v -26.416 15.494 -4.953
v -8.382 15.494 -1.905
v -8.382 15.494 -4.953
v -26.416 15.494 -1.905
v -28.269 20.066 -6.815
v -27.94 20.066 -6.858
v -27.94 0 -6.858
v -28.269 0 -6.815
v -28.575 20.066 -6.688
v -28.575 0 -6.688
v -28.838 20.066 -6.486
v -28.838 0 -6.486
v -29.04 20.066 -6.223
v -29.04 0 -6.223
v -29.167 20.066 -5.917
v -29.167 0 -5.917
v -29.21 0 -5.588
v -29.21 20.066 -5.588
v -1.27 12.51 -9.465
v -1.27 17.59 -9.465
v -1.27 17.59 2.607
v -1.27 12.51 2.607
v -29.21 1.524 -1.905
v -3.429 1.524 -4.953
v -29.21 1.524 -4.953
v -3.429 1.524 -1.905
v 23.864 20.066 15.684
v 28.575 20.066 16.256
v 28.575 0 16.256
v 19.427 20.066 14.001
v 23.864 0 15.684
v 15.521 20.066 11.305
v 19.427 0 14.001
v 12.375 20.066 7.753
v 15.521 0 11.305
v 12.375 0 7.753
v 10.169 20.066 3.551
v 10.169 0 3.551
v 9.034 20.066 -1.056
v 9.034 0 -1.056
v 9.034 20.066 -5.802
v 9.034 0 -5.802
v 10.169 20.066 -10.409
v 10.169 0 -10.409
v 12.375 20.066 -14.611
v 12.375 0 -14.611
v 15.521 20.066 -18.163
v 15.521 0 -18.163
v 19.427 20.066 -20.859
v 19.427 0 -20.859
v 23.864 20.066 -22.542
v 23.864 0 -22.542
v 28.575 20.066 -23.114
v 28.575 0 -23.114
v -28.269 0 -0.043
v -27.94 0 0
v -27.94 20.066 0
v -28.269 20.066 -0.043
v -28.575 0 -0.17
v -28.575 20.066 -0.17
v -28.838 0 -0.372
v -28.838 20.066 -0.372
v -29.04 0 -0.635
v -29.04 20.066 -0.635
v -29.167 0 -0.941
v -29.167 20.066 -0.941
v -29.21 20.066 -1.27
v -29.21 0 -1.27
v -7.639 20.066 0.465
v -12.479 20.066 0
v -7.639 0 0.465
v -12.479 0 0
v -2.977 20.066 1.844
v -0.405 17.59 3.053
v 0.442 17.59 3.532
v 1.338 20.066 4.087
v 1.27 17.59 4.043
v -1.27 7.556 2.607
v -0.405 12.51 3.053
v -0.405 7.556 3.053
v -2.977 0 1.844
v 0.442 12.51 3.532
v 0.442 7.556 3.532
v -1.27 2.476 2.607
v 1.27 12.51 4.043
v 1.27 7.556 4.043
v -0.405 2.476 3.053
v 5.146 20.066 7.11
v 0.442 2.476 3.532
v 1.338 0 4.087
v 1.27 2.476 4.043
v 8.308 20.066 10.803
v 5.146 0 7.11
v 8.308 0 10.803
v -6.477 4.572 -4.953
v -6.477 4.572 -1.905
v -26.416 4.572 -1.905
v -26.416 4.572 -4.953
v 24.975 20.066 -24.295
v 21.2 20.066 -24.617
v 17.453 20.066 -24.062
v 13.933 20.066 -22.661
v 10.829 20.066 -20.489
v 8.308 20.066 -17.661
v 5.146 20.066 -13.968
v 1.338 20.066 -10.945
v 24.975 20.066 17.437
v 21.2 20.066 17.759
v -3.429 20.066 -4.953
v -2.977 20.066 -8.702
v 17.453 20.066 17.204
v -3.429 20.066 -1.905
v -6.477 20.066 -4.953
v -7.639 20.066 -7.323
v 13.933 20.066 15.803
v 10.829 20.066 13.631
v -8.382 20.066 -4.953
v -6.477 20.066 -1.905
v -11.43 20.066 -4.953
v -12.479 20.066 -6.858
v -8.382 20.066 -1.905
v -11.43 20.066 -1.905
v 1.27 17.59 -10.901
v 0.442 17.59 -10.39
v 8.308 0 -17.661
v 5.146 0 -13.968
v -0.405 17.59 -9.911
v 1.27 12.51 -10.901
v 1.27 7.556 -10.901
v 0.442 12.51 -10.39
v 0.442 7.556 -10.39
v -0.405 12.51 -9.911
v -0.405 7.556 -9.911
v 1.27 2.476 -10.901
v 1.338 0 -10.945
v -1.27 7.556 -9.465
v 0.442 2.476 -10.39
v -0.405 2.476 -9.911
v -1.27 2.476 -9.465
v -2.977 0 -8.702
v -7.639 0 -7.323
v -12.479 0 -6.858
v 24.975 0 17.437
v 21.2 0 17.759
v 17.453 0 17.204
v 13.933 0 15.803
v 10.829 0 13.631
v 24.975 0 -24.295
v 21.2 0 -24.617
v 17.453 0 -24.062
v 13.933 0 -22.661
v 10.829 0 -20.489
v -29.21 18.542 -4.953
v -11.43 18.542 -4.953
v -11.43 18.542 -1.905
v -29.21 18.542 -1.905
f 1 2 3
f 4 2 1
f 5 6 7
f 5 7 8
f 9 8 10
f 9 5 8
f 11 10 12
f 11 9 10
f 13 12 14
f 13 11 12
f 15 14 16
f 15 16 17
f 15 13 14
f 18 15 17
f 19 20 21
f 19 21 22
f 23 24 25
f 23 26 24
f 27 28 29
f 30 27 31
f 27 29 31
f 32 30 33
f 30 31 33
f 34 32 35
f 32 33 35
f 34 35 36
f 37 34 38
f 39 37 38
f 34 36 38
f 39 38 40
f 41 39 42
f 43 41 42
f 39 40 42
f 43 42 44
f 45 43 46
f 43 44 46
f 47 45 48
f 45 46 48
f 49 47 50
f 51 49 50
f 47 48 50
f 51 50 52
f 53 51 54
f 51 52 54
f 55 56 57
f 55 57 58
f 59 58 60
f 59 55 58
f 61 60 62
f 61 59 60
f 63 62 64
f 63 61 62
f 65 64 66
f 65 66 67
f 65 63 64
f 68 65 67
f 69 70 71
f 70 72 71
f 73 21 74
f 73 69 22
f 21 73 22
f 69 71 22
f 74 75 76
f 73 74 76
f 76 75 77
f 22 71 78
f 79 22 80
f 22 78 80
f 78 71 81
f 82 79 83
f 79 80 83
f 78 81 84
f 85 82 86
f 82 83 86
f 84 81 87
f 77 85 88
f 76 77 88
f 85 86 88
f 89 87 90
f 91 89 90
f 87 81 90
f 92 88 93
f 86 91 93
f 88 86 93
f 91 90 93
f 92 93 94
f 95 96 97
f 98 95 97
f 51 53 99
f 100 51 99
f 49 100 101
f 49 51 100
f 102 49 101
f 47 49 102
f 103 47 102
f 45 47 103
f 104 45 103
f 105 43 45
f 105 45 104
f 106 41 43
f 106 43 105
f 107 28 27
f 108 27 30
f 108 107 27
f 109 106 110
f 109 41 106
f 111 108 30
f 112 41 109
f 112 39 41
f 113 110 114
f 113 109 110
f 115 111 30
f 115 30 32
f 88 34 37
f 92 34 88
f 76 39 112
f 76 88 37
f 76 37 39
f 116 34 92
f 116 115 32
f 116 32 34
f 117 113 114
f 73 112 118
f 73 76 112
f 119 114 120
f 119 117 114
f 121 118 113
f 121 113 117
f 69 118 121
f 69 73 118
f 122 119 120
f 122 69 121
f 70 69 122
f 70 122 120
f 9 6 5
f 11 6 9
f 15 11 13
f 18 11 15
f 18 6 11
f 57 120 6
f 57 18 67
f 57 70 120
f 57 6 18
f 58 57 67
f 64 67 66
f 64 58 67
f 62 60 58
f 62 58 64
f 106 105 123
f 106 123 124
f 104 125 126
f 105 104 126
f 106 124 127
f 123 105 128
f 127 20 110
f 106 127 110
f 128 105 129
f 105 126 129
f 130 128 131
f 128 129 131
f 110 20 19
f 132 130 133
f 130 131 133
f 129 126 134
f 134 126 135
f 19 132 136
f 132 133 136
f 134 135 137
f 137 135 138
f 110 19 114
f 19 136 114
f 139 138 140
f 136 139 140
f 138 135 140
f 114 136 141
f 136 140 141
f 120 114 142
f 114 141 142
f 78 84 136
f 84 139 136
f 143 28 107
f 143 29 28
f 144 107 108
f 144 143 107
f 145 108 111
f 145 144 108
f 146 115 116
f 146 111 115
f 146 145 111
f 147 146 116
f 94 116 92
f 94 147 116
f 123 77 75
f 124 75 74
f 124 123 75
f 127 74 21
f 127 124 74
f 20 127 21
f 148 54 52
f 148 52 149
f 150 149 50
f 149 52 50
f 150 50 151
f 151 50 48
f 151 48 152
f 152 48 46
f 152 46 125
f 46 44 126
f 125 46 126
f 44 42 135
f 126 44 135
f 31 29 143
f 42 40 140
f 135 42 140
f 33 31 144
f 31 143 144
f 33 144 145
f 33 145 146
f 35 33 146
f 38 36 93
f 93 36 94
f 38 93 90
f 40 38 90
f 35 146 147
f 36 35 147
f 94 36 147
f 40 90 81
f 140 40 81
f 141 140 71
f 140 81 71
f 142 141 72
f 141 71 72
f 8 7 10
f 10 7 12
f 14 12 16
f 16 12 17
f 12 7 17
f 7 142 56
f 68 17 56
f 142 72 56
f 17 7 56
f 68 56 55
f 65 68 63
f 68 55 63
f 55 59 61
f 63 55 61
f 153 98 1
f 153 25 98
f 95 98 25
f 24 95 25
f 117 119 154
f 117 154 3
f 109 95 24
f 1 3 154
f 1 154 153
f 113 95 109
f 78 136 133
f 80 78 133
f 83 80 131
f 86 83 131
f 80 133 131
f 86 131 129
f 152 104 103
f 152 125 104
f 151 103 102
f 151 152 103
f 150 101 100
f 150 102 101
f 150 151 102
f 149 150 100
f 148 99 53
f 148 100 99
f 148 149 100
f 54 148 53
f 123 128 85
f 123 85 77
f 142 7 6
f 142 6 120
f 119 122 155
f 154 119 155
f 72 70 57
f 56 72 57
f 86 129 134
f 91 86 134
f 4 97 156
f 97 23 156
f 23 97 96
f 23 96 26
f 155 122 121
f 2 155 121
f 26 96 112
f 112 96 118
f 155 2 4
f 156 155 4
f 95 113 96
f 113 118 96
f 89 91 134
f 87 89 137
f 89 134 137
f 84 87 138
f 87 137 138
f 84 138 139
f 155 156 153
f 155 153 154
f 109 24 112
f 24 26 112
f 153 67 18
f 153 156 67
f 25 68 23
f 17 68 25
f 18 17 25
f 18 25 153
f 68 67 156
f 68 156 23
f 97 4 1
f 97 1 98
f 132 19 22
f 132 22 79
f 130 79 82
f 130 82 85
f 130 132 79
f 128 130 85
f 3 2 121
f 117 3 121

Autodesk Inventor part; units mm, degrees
ref_plane "YZ Plane" through (0, 0, 0) normal (1, 0, 0) x (0, 1, 0)
ref_plane "XZ Plane" through (0, 0, 0) normal (0, 1, 0) x (-1, 0, 0)
ref_plane "XY Plane" through (0, 0, 0) normal (0, 0, 1) x (1, 0, 0)
sketch "Sketch1" plane through (0, 0, 0) normal (0, 1, 0) x (-1, 0, 0)
  line L0 (0, 0) -> (29.21, 0)
  line L1 (29.21, 0) -> (29.21, -6.858)
  line L2 (29.21, -6.858) -> (0, -6.858)
  line L3 (0, -6.858) -> (0, 0)
  line L4 (0, 0) -> (-3.81, 0)
  line L5 (-3.81, 0) -> (-3.81, -6.858)
  line L6 (-3.81, -6.858) -> (0, -6.858)
  line L7 (0, -6.858) -> (0, 0)
  circle A0 centre (-28.575, -3.429) radius 19.685
  circle A1 centre (-28.575, -3.429) radius 24.765
  arc A2 (-8.3079, 10.803) -> (12.4788, 0) centre (12.4788, 25.4) ccw
  arc A3 (12.4788, -6.858) -> (-8.3079, -17.661) centre (12.4788, -32.258) ccw
  line L8 (-28.575, -3.429) -> (-28.575, 21.336)
  line L9 (-28.575, -3.429) -> (-3.81, -3.429) construction
  line L10 (-28.575, -3.429) -> (-28.575, -28.194)
  arc A4 (-8.3079, 10.803) -> (-28.575, 16.256) centre (-21.7065, 1.3942) ccw
  arc A5 (-28.575, -23.114) -> (-8.3079, -17.661) centre (-21.7065, -8.2522) ccw
  point P0 (0, -3.429)
  dimension "d0" = 29.21
  dimension "d1" = 6.858
  dimension "d4" = 3.81
  dimension "d5" = 39.37
  dimension "d6" = 6.858
  dimension "d7" = 5.08
  dimension "d8" = 25.4
  dimension "d9" = 25.4
  dimension "d10" = 180
  dimension "d11" = 90
  dimension "d12" = 90
extrude "Extrusion1" add sketch "Sketch1" along normal blind 20.066 contours L4 L5 A1 A2 L0 | L0 L1 L2 L3 | L3 L6 L5 L4 | L2 A3 A1 L5 L6 | A1 A5 A0 A4
sketch "Sketch3" plane through (-29.21, 0, 0) normal (0, 0, 1) x (1, 0, 0)
  line L0 (0, 0) -> (16.7312, 0) projected
  line L1 (16.7312, 0) -> (16.7312, 20.066) projected
  line L2 (0, 20.066) -> (16.7312, 20.066) projected
  line L3 (0, 0) -> (0, 20.066) projected
  line L4 (16.7312, 0) -> (37.5179, 0) projected
  line L5 (37.5179, 0) -> (37.5179, 20.066) projected
  line L6 (16.7312, 20.066) -> (37.5179, 20.066) projected
  line L7 (16.7312, 0) -> (16.7312, 20.066) projected
  line L8 (37.5179, 0) -> (57.785, 0) projected
  line L9 (57.785, 0) -> (57.785, 20.066) projected
  line L10 (37.5179, 20.066) -> (57.785, 20.066) projected
  line L11 (37.5179, 0) -> (37.5179, 20.066) projected
  line L12 (0, 0) -> (0, 20.066) projected
  line L13 (0, 10.033) -> (29.21, 10.033) construction
  line L14 (16.7312, 20.066) -> (37.5179, 20.066) projected
  line L15 (29.21, 20.066) -> (29.21, 0) construction
  line L16 (16.7312, 0) -> (37.5179, 0) projected
  line L17 (27.94, 12.5095) -> (30.48, 12.5095)
  line L18 (30.48, 12.5095) -> (30.48, 17.5895)
  line L19 (30.48, 17.5895) -> (27.94, 17.5895)
  line L20 (27.94, 17.5895) -> (27.94, 12.5095)
  line L21 (27.94, 7.5565) -> (30.48, 7.5565)
  line L22 (30.48, 7.5565) -> (30.48, 2.4765)
  line L23 (30.48, 2.4765) -> (27.94, 2.4765)
  line L24 (27.94, 2.4765) -> (27.94, 7.5565)
  point P0 (29.21, 0)
  point P1 (29.21, 12.5095)
  dimension "d13" = 29.21
  dimension "d14" = 2.54
  dimension "d15" = 5.08
  dimension "d16" = 2.4765
  dimension "d17" = 2.4765
extrude "Extrusion2" cut sketch "Sketch3" along normal through all both and the other way through all contours L20 L19 L18 L17 | L21 L22 L23 L24
sketch "Sketch4" plane through (-29.21, 0, 0) normal (0, 0, 1) x (1, 0, 0)
  line L0 (0, 20.066) -> (16.7312, 20.066) projected
  line L1 (0, 0) -> (16.7312, 0) projected
  line L2 (0, 0) -> (0, 20.066) projected
  line L3 (0, 18.542) -> (2.794, 18.542)
  line L4 (2.794, 18.542) -> (2.794, 1.524)
  line L5 (2.794, 1.524) -> (0, 1.524)
  line L6 (0, 1.524) -> (0, 18.542)
  line L7 (0, 10.033) -> (17.78, 10.033) construction
  line L8 (2.794, 18.542) -> (17.78, 18.542)
  line L9 (17.78, 18.542) -> (17.78, 15.494)
  line L10 (17.78, 15.494) -> (2.794, 15.494)
  line L11 (2.794, 15.494) -> (2.794, 18.542)
  line L12 (16.7312, 20.066) -> (37.5179, 20.066) projected
  line L13 (17.78, 15.494) -> (20.828, 15.494)
  line L14 (20.828, 15.494) -> (20.828, 20.066)
  line L15 (20.828, 20.066) -> (17.78, 20.066)
  line L16 (17.78, 20.066) -> (17.78, 15.494)
  line L17 (2.794, 1.524) -> (22.733, 1.524)
  line L18 (22.733, 1.524) -> (22.733, 4.572)
  line L19 (22.733, 4.572) -> (2.794, 4.572)
  line L20 (2.794, 4.572) -> (2.794, 1.524)
  line L21 (22.733, 1.524) -> (25.781, 1.524)
  line L22 (25.781, 1.524) -> (25.781, 20.066)
  line L23 (25.781, 20.066) -> (22.733, 20.066)
  line L24 (22.733, 20.066) -> (22.733, 1.524)
  point P0 (29.21, 0)
  point P1 (17.78, 17.018)
  point P2 (2.794, 4.572)
  point P3 (2.794, 15.494)
  point P4 (17.78, 18.542)
  dimension "d25" = 2.794
  dimension "d26" = 17.018
  dimension "d27" = 1.524
  dimension "d28" = 1.524
  dimension "d29" = 17.78
  dimension "d30" = 3.048
  dimension "d31" = 3.048
  dimension "d32" = 1.905
  dimension "d33" = 3.048
  dimension "d34" = 3.048
extrude "Extrusion3" cut sketch "Sketch4" against normal blind 4.953 contours L3 L4 L5 L2 | L12 L14 L13 L9 L16 | L8 L9 L10 L4 | L4 L19 L18 L17 | L12 L22 L21 L18 L24
sketch "Sketch5" plane through (-26.416, 4.572, 0) normal (0, 0, 1) x (1, 0, 0)
  line L0 (-2.794, 13.97) -> (13.9372, 13.97) projected
  line L1 (13.9372, 10.922) -> (0, 10.922) projected
  line L2 (13.9372, 10.922) -> (13.9372, 13.97) projected
  line L3 (-2.794, -3.048) -> (-2.794, 13.97) projected
  line L4 (0, 10.922) -> (0, 0) projected
  line L5 (13.9372, -3.048) -> (-2.794, -3.048) projected
  line L6 (0, 0) -> (13.9372, 0) projected
  line L7 (13.9372, -3.048) -> (13.9372, 0) projected
  line L8 (13.9372, 10.922) -> (13.9372, 13.97) projected
  line L9 (14.986, 13.97) -> (13.9372, 13.97) projected
  line L10 (14.986, 15.494) -> (14.986, 13.97) projected
  line L11 (18.034, 15.494) -> (14.986, 15.494) projected
  line L12 (18.034, 10.922) -> (18.034, 15.494) projected
  line L13 (13.9372, 10.922) -> (18.034, 10.922) projected
  line L14 (13.9372, -3.048) -> (13.9372, 0) projected
  line L15 (19.939, 0) -> (13.9372, 0) projected
  line L16 (19.939, 15.494) -> (19.939, 0) projected
  line L17 (22.987, 15.494) -> (19.939, 15.494) projected
  line L18 (22.987, -3.048) -> (22.987, 15.494) projected
  line L19 (13.9372, -3.048) -> (22.987, -3.048) projected
  point P0 (26.416, -4.572)
extrude "Extrusion4" add sketch "Sketch5" against normal blind 1.905
fillet "Fillet1" radius 1.27 2 edges at (-29.21, 10.033, 0) (-29.21, 10.033, -6.858)
equation "\"d6\" = d1"
equation "\"d9\" = d8"
equation "\"d11\" = d12"
equation "\"d16\" = d17"
equation "\"d27\" = d28"
properties part number "ReedHolder"
